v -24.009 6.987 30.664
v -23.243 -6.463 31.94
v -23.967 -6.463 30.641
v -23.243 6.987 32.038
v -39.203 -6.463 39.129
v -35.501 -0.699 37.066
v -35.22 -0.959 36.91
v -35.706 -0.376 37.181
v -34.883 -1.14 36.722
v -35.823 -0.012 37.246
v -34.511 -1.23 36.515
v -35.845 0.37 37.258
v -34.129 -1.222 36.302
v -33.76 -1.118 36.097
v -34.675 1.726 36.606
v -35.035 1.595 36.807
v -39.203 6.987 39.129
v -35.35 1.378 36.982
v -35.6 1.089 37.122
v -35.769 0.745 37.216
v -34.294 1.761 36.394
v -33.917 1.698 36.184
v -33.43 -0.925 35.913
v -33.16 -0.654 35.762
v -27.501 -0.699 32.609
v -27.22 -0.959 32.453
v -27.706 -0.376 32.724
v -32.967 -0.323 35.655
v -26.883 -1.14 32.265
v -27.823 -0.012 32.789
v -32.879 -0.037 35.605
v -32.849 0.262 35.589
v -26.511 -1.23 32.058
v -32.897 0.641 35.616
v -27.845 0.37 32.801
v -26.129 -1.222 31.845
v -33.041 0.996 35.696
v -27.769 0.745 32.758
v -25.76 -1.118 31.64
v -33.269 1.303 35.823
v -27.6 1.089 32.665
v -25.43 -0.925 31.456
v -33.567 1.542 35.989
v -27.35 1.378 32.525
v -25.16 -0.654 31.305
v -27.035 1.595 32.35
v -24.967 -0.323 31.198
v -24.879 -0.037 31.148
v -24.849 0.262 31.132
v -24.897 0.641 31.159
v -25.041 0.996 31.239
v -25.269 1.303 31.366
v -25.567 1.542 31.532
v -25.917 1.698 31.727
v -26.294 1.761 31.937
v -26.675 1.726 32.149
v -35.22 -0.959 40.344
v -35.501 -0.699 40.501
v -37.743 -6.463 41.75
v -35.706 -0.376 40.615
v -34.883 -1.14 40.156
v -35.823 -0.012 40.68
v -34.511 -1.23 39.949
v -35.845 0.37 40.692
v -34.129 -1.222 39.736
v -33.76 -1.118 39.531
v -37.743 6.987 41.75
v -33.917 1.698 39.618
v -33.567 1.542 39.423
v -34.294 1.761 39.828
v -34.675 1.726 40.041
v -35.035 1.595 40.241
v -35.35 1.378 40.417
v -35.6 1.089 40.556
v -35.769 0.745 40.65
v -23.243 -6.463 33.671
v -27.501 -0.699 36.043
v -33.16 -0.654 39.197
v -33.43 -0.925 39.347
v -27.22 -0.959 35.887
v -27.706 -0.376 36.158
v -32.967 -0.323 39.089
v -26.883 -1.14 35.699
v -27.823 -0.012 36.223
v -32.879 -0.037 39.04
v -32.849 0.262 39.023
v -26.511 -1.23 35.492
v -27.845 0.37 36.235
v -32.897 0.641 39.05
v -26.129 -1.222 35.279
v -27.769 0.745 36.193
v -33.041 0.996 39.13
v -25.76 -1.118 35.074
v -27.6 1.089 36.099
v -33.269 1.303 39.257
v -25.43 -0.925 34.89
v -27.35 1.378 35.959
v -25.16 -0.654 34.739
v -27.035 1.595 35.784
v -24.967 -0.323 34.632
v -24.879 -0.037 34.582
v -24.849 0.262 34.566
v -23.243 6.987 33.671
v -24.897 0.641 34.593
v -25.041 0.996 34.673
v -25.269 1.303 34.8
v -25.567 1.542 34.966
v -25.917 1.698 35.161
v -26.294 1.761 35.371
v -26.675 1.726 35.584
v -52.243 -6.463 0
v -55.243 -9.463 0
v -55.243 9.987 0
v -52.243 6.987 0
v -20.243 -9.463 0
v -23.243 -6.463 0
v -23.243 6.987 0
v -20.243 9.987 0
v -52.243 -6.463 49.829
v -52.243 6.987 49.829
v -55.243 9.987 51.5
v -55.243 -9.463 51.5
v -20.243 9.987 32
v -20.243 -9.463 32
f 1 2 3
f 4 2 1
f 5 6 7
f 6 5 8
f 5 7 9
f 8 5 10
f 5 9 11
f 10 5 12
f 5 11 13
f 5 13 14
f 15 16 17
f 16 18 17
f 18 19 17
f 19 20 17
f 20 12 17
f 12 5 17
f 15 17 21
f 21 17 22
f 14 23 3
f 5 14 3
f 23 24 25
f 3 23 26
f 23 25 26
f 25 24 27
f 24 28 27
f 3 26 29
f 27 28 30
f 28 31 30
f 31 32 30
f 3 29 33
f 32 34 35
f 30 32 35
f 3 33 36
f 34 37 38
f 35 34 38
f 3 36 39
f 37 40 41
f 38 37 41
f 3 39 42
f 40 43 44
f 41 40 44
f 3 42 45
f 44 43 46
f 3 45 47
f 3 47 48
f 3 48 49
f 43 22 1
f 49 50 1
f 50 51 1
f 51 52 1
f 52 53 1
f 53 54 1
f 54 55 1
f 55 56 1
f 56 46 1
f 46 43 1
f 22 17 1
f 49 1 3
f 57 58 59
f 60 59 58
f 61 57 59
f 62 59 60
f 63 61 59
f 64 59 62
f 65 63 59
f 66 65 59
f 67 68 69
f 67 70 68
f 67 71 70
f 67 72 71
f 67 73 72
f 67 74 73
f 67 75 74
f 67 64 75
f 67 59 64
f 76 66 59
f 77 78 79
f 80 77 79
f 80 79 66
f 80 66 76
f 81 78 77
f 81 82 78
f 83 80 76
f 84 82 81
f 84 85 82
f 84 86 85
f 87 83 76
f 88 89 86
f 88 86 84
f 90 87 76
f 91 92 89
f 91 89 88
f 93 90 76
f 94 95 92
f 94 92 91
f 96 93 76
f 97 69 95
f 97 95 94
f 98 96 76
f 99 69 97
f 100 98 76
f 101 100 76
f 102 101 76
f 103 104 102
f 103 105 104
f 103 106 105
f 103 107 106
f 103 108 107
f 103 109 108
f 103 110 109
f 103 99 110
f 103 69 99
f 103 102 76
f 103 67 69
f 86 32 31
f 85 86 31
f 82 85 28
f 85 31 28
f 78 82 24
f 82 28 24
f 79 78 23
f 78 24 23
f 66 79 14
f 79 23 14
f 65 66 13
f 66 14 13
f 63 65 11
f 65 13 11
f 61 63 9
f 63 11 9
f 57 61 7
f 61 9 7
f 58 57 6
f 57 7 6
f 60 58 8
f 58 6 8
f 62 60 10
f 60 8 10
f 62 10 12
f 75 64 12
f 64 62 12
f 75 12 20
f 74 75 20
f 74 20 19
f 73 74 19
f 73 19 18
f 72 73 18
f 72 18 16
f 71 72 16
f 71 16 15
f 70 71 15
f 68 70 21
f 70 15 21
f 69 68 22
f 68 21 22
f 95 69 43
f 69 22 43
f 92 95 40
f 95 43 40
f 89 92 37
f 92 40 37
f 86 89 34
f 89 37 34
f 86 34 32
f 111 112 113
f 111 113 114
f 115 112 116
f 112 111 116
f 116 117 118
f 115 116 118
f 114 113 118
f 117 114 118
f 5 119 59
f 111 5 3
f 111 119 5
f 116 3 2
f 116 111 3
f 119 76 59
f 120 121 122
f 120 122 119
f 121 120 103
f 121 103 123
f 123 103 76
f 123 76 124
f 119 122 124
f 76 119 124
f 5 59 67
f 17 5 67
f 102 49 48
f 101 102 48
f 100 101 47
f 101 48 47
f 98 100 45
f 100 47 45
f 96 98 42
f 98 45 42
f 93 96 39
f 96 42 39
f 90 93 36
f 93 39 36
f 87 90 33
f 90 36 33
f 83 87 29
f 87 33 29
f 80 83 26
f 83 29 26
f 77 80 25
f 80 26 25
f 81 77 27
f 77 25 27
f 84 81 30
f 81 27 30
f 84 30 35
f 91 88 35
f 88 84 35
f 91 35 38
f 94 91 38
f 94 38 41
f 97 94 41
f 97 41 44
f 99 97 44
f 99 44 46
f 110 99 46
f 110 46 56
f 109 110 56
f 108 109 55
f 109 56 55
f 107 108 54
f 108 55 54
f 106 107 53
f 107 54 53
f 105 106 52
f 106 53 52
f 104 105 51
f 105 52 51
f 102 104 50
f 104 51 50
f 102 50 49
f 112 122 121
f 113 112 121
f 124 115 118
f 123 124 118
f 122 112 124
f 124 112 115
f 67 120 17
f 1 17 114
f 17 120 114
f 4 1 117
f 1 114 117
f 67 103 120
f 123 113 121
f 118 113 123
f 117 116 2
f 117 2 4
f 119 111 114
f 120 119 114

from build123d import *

# Parameters (mm, degrees)
F0_W     = 35
F0_H     = 19.45
F0_W_2   = 29
F0_H_2   = 13.45
F1_DEPTH = 51.5
F3_DEPTH = 25
F4_W     = 16.598594
F4_H     = 13.45
F4_R     = 1.5
F5_DEPTH = 3
F6_R     = 1.5
F7_DEPTH = 46.3


with BuildPart() as f1:
    # F0 (on Top) → F1 (new body)
    with BuildSketch(Plane.XY):
        with Locations((-37.743293, 0.261565)):
            Rectangle(F0_W, F0_H)
        with Locations((-37.743293, 0.261565)):
            Rectangle(F0_W_2, F0_H_2, mode=Mode.SUBTRACT)
    extrude(amount=F1_DEPTH)

    # F2 (on face) → F3 (cut)
    with BuildSketch(Plane.XZ.offset(9.463435)):
        Polygon((-20.243293, 51.5), (-55.243293, 51.5), (-20.243293, 32), align=None)
    extrude(amount=-F3_DEPTH, mode=Mode.SUBTRACT)

    # F4 (on face) → F5 (join)
    with BuildSketch(Plane(origin=(8.810147, 0, 15.813084), x_dir=(0.873568, 0, -0.486702), z_dir=(0.486702, 0, 0.873568))):
        with Locations((-44.99185, 0.261565)):
            Rectangle(F4_W, F4_H)
        with Locations((-49.282474, 0.261565)):
            Circle(F4_R, mode=Mode.SUBTRACT)
        with Locations((-41.720062, 0)):
            Circle(F4_R, mode=Mode.SUBTRACT)
        Polygon((-35.897397, 6.986565), (-36.692553, 6.986565), (-36.692553, -6.463435), (-35.849709, -6.463435), align=None)
        with Locations((-41.720062, 0)):
            Circle(F4_R)
        with Locations((-49.282474, 0.261565)):
            Circle(F4_R)
    extrude(amount=-F5_DEPTH)

    # F6 (on face) → F7 (cut)
    with BuildSketch(Plane(origin=(0, 0, 0), x_dir=(1, 0, 0), z_dir=(0, 0, -1))):
        with Locations((-26.34857, -0.261565)):
            Circle(F6_R)
        with Locations((-34.34857, -0.261565)):
            Circle(F6_R)
    extrude(amount=-F7_DEPTH, mode=Mode.SUBTRACT)


solid = f1.part
